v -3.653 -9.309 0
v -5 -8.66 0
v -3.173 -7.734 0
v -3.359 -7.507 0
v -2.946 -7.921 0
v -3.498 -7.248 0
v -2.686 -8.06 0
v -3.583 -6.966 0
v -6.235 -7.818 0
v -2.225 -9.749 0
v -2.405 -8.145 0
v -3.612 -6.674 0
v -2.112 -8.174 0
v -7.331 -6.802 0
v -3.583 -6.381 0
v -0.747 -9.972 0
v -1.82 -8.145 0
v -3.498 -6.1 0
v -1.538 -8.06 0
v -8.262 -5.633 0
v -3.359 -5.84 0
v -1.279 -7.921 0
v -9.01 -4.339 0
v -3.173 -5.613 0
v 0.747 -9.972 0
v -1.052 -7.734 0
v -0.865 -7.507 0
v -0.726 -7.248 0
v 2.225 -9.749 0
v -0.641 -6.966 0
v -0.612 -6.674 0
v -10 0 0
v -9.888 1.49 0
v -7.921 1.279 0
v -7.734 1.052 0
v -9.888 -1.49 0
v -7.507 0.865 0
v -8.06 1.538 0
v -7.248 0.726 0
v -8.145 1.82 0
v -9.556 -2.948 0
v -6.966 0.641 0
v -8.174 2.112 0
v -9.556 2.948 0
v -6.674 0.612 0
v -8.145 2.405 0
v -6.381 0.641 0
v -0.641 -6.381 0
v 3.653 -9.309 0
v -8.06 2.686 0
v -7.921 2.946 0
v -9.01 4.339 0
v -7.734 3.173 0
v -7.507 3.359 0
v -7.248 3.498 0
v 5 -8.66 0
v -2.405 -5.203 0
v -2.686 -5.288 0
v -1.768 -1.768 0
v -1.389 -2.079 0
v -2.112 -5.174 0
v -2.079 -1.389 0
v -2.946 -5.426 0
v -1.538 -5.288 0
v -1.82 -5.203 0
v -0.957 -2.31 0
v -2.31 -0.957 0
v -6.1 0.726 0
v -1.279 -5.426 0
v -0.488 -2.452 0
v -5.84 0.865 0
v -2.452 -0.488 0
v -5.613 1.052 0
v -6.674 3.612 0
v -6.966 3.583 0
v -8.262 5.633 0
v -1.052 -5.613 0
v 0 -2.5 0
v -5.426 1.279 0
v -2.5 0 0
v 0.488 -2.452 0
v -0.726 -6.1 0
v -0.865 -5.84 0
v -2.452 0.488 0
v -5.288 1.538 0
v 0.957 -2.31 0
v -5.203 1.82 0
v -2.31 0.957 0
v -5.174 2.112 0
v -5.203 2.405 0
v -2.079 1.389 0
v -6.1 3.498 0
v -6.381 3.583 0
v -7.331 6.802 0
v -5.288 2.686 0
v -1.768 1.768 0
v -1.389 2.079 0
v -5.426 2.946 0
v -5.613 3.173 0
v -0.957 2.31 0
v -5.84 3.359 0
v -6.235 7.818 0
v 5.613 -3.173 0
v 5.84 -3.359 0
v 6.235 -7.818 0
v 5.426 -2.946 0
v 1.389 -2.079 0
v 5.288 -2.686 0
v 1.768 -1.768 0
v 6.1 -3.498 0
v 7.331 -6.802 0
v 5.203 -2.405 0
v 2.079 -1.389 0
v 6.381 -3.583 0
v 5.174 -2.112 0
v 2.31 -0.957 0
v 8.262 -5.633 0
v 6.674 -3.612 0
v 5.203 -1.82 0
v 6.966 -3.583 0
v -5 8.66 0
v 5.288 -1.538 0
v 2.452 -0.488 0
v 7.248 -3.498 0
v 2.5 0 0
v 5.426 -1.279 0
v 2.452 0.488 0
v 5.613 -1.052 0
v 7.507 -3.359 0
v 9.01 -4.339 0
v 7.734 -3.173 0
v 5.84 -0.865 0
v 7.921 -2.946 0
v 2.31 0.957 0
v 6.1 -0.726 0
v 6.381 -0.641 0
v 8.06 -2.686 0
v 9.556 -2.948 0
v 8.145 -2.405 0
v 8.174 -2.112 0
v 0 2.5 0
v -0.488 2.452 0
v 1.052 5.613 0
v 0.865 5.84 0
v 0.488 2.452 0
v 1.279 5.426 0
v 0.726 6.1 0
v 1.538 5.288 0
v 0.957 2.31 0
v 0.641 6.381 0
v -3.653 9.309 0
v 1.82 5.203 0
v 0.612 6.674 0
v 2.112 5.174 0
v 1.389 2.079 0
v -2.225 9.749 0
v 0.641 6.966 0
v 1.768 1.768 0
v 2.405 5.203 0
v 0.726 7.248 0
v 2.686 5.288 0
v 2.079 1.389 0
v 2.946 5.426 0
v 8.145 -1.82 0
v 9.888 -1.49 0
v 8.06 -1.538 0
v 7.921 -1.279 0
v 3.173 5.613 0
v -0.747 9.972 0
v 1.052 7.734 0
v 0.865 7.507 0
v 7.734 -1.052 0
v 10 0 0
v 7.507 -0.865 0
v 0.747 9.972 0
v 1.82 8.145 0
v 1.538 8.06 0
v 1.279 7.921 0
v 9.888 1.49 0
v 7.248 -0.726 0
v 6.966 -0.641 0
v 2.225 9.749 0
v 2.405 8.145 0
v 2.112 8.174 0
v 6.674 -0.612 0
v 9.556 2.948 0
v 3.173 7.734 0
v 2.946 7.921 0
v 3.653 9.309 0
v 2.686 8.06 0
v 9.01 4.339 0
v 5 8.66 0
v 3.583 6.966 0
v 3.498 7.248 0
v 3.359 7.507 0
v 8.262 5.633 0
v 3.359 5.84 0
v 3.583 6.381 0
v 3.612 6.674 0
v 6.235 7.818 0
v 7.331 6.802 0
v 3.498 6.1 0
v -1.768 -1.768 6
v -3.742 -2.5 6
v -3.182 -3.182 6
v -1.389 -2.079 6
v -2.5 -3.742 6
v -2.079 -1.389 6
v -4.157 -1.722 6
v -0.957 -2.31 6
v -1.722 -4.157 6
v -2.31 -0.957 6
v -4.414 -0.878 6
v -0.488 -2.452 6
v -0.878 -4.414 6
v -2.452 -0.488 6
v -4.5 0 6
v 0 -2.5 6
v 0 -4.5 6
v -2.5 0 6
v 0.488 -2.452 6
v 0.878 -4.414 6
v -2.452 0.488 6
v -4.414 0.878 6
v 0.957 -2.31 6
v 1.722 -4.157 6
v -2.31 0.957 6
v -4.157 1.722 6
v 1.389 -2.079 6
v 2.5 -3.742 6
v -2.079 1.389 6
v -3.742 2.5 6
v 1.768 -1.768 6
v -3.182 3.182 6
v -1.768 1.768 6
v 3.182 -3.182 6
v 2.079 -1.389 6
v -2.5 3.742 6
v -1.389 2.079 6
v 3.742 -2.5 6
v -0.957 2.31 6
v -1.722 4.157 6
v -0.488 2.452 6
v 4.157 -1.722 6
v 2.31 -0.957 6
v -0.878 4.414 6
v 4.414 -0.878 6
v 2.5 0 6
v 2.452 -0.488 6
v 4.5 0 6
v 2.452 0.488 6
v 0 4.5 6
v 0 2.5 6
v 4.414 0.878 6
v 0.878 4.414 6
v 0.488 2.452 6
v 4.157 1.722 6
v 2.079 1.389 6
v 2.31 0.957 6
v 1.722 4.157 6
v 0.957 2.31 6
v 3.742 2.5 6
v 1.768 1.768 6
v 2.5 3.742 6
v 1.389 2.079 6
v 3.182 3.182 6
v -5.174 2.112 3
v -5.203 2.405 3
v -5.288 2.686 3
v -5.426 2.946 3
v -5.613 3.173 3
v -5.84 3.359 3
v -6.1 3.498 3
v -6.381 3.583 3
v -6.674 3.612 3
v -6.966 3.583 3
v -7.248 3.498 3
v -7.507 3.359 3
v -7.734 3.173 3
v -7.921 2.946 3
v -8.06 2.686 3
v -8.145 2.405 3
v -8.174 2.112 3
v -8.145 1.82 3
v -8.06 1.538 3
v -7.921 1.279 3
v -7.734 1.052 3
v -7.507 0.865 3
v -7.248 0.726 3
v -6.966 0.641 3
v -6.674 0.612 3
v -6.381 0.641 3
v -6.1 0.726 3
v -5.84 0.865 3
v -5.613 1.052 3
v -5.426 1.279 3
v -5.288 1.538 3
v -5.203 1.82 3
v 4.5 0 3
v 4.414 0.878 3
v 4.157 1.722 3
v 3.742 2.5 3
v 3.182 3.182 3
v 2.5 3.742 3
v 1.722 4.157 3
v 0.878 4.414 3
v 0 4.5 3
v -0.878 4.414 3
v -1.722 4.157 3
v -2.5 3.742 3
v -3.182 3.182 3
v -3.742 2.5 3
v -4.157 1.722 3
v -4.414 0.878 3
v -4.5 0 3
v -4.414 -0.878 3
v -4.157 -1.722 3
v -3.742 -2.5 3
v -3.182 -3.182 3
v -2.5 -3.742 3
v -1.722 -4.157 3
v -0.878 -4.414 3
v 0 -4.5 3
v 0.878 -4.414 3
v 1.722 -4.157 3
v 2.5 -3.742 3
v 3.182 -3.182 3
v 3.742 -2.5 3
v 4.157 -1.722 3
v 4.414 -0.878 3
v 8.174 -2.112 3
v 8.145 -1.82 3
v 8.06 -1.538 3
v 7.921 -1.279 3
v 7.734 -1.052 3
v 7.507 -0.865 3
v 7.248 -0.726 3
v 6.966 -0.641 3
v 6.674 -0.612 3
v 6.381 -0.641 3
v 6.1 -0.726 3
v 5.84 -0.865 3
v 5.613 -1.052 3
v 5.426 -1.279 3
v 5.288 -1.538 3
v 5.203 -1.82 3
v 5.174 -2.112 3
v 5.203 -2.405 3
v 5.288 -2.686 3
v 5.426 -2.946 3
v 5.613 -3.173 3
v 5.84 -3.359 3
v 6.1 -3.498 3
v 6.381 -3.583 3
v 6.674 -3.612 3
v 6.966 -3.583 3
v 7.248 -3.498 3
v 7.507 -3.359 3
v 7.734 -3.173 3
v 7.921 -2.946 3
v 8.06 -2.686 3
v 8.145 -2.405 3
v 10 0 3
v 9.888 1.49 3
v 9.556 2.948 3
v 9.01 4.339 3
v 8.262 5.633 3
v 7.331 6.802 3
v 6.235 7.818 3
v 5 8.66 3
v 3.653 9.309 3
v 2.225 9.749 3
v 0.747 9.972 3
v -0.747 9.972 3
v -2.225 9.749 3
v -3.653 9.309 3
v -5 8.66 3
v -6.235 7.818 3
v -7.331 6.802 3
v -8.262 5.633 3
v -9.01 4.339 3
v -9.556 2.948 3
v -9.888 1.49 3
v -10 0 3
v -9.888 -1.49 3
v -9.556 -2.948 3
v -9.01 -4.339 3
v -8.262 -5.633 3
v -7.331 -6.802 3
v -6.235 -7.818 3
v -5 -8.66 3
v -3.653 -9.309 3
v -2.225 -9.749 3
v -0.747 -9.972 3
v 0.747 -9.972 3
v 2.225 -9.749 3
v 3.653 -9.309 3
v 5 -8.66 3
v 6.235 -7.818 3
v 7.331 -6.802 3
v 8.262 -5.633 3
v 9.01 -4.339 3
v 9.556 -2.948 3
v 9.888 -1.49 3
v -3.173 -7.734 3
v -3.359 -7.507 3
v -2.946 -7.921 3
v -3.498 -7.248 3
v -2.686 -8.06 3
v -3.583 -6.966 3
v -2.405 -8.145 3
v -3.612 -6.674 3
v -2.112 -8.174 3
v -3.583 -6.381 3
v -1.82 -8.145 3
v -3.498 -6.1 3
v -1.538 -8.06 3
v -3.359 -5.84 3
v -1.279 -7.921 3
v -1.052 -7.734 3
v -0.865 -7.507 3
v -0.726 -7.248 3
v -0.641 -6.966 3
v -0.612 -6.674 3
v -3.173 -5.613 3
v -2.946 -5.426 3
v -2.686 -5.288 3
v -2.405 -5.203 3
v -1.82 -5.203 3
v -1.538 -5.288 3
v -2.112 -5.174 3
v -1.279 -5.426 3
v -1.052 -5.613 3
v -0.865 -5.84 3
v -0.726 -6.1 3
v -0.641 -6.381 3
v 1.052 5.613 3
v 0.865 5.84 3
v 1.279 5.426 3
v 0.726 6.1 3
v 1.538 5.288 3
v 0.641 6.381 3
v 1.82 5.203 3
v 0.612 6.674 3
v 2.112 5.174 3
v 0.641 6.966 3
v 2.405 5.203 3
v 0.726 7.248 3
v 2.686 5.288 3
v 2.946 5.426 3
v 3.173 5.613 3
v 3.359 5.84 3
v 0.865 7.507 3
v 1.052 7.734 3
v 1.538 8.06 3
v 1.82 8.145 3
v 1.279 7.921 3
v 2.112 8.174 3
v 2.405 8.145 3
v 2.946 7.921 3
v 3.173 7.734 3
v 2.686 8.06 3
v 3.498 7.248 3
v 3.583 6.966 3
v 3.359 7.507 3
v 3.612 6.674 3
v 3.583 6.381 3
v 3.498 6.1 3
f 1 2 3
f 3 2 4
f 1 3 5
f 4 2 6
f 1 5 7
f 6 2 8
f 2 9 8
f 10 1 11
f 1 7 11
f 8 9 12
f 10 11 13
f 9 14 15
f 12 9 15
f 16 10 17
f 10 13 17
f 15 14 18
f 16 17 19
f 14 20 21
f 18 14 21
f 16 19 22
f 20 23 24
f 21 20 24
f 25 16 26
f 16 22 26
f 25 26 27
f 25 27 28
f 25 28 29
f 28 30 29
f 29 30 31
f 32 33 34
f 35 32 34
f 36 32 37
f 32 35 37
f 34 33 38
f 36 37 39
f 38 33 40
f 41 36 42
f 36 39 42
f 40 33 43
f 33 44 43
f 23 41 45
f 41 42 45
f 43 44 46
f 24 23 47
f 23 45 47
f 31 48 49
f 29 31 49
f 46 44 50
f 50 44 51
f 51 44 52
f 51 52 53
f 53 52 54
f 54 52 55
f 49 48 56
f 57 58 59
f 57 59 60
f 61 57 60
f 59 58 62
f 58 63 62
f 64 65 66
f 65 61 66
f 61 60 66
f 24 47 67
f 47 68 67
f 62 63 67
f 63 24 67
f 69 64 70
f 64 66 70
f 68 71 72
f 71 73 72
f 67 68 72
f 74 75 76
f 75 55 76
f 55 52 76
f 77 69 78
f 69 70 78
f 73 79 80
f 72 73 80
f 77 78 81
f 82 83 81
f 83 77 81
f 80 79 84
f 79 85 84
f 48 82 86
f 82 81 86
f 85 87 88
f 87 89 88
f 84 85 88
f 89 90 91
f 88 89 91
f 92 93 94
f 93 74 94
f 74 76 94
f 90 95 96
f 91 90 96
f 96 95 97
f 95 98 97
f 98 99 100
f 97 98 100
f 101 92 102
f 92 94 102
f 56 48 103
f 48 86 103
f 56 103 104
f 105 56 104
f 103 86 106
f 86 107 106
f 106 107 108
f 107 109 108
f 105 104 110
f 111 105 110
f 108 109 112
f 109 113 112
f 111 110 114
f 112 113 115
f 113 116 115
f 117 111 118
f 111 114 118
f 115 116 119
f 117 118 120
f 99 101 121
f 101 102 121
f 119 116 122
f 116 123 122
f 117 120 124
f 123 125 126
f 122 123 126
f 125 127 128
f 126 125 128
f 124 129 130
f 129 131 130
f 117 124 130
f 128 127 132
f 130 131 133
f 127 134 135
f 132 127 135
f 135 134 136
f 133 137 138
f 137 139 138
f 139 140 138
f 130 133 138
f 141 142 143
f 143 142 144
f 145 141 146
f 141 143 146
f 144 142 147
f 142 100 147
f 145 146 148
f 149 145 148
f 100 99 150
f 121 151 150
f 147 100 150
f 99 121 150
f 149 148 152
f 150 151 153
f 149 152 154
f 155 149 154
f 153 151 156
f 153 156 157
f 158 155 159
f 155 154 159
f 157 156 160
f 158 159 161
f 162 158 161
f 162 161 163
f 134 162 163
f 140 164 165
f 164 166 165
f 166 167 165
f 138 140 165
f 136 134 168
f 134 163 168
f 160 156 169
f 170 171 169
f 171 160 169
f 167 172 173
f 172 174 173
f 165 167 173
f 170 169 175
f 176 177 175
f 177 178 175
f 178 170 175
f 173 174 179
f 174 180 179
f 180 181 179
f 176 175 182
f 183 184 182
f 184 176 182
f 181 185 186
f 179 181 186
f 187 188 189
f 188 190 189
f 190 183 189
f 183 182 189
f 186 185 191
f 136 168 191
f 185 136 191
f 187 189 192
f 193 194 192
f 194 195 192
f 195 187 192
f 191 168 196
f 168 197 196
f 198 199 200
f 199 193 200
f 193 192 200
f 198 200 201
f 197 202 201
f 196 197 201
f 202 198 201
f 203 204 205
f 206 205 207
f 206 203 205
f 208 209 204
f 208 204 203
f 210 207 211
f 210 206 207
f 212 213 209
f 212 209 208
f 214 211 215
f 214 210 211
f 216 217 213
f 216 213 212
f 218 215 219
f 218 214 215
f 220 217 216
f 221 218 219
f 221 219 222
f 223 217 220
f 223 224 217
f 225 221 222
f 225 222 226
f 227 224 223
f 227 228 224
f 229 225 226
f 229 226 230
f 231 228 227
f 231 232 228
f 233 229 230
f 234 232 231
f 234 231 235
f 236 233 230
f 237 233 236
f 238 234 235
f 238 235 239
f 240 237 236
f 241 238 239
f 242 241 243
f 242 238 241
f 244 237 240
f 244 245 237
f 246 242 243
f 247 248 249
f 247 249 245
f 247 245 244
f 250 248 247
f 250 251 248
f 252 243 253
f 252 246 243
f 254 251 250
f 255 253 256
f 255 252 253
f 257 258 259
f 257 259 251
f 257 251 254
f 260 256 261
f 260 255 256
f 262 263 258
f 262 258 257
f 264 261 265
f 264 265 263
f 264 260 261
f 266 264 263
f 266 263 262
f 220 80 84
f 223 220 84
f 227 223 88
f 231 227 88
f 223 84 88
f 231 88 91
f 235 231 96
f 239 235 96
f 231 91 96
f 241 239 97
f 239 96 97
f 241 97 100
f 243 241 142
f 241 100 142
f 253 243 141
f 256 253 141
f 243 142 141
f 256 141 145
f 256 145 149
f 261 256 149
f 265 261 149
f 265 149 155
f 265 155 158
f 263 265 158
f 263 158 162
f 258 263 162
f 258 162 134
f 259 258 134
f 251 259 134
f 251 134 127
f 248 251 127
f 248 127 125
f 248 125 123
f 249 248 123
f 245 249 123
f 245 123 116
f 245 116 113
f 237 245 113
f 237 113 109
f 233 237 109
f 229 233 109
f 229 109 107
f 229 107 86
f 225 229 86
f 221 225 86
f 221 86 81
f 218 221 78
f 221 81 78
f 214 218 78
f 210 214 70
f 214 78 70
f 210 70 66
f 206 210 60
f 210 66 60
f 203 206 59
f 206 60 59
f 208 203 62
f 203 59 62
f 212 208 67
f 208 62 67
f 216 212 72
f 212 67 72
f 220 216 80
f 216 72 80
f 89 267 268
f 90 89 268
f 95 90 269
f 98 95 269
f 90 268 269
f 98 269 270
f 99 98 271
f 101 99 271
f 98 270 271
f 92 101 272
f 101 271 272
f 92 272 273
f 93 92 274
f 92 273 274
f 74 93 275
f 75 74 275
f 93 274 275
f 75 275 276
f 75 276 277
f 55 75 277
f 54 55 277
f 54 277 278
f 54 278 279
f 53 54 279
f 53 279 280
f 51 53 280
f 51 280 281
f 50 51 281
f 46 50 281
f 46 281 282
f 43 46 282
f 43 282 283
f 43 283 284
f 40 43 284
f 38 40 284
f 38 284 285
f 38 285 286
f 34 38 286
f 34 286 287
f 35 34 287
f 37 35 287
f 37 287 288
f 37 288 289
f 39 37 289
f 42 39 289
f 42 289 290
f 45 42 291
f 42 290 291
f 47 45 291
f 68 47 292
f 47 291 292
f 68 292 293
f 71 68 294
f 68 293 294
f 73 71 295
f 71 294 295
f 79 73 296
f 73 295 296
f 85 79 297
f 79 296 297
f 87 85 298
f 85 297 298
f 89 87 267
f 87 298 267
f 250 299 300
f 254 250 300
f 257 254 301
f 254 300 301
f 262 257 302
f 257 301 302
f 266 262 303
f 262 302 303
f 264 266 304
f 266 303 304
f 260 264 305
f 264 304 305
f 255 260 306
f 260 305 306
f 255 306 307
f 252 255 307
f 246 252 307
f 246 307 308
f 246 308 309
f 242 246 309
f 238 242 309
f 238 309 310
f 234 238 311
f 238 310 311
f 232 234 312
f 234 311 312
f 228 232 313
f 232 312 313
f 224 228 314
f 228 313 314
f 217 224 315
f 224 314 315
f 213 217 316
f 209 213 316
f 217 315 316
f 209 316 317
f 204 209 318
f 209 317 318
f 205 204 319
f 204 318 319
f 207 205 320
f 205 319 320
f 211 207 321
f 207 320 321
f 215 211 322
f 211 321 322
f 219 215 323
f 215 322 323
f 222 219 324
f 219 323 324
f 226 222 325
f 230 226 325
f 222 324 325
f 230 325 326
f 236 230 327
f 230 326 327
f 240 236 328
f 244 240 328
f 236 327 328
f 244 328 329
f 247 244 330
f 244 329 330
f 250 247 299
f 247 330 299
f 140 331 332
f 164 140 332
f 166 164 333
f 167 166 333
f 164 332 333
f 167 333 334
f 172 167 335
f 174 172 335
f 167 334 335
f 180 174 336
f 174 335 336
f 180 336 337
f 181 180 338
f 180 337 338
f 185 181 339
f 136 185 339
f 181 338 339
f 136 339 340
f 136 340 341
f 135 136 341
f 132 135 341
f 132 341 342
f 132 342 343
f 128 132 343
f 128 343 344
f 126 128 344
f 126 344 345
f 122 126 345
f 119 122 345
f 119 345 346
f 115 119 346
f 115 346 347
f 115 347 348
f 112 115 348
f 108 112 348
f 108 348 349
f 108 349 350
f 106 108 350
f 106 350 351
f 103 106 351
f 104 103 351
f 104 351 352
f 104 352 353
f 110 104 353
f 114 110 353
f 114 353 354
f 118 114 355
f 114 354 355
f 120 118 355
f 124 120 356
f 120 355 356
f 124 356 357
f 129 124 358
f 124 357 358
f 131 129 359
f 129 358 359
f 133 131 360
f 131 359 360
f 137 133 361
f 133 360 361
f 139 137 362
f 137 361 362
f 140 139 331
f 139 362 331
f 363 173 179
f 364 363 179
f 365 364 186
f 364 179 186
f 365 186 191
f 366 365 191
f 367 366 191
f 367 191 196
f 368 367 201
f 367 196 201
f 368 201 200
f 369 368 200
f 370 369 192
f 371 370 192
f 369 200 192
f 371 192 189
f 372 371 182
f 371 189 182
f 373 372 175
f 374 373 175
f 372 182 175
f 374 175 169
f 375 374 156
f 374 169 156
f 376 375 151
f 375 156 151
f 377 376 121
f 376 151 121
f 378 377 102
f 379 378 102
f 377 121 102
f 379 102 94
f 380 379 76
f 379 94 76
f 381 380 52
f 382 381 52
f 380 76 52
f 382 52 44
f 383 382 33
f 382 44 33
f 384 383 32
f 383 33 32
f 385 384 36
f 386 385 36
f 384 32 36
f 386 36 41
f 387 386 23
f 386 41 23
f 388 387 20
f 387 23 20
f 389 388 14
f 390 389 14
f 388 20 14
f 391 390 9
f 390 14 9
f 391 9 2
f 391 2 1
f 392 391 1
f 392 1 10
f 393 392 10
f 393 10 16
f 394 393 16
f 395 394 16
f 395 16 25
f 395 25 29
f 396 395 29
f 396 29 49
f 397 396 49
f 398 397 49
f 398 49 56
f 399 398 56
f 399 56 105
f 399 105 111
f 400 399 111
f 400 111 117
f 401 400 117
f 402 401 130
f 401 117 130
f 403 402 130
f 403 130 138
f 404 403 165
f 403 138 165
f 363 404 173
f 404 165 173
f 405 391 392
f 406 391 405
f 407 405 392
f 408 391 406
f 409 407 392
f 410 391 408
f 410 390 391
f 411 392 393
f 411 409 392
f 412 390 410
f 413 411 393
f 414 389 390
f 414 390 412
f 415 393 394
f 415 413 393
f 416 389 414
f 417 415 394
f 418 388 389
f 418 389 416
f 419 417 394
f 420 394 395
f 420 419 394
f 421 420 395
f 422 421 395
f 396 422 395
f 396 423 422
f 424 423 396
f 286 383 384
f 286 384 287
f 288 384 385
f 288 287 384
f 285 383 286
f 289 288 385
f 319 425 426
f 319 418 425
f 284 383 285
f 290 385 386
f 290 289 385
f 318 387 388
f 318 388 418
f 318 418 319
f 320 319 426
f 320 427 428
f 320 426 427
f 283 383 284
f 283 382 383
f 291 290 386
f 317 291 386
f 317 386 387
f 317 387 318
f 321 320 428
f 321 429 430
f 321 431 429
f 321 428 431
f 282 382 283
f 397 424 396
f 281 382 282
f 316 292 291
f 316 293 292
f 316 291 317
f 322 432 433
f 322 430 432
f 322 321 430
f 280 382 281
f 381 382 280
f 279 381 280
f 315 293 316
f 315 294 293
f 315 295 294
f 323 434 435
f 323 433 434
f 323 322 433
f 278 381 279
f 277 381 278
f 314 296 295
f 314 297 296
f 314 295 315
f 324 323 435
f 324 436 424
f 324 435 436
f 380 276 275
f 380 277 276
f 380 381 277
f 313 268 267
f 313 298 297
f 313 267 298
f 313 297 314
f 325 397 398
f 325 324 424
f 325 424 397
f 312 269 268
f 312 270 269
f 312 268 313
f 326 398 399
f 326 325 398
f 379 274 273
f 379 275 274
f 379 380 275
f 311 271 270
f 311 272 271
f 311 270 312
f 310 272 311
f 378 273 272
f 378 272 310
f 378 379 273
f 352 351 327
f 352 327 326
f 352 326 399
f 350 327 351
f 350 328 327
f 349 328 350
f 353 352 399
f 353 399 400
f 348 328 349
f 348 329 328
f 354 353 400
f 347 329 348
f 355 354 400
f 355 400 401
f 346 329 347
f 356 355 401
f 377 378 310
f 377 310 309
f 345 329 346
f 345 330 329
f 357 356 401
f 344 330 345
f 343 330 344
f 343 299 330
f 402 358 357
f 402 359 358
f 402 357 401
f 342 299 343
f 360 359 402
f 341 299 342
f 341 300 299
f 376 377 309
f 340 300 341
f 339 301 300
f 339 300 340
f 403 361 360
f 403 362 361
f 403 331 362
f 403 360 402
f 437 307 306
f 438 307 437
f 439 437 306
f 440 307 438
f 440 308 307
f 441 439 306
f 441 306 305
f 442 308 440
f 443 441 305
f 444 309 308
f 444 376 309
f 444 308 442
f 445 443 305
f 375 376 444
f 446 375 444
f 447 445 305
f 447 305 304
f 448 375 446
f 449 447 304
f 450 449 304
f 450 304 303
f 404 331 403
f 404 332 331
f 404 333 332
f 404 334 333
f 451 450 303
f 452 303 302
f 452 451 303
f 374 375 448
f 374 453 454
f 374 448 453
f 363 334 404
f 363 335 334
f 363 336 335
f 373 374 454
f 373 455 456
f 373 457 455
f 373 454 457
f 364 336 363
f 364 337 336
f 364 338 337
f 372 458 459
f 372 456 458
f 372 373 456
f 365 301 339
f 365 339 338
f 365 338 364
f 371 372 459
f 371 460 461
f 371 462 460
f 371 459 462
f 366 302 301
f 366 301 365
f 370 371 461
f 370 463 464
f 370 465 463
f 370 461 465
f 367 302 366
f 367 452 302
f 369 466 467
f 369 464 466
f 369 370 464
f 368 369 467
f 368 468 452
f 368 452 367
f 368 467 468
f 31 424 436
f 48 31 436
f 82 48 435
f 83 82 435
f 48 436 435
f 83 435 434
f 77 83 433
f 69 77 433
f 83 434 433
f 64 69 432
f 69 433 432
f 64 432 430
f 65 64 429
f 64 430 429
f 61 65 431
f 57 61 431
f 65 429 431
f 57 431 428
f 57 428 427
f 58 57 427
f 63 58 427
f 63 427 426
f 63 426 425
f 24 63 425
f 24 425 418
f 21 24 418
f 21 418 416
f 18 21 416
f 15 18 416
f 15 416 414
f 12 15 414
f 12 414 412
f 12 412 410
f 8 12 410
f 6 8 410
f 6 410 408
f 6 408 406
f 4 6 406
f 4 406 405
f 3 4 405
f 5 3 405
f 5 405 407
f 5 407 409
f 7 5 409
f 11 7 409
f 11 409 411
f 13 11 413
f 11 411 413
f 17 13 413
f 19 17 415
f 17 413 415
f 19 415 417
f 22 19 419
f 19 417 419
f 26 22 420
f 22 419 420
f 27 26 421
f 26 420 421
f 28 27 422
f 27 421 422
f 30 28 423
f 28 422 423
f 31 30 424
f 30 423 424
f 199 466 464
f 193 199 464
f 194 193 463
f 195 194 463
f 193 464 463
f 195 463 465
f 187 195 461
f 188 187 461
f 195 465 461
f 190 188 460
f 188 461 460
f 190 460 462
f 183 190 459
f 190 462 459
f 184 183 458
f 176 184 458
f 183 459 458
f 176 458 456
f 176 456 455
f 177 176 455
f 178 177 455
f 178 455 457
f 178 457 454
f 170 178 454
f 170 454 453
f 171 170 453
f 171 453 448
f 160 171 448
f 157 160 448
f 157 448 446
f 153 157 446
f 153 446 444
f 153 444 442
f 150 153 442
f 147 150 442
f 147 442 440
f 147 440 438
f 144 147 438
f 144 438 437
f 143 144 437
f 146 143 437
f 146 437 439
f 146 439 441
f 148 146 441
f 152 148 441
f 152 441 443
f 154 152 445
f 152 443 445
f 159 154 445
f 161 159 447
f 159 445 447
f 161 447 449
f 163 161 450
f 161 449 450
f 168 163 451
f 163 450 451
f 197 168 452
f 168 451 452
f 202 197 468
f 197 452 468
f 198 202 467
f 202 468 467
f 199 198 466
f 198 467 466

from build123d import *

# Parameters (mm, degrees)
SKETCH1_R             = 10
BOSS_EXTRUDE1_DEPTH   = 3
SKETCH2_R             = 4.5
BOSS_EXTRUDE2_DEPTH   = 3
F_3_0MM_DOWEL_HOLE1_D = 3
F_5_0MM_DOWEL_HOLE1_D = 5


with BuildPart() as part:
    # Sketch1 → Boss-Extrude1 (new body)
    with BuildSketch(Plane.XY):
        Circle(SKETCH1_R)
    extrude(amount=BOSS_EXTRUDE1_DEPTH)

    # Sketch2 → Boss-Extrude2 (add)
    with BuildSketch(Plane.XY.offset(3)):
        Circle(SKETCH2_R)
    extrude(amount=BOSS_EXTRUDE2_DEPTH)

    # Ø3.0mm Dowel Hole1 (through all)
    with Locations(Plane(origin=(0, 0, 0), x_dir=(-1, 0, 0), z_dir=(0, 0, -1))):
        with Locations((6.673703276, 2.112270007), (2.112270007, -6.673703276), (-6.673703276, -2.112270007), (-2.112270007, 6.673703276)):
            Hole(F_3_0MM_DOWEL_HOLE1_D / 2)

    # Ø5.0mm Dowel Hole1 (through all)
    with Locations(Plane.XY.offset(6)):
        with Locations((0, 0)):
            Hole(F_5_0MM_DOWEL_HOLE1_D / 2)


solid = part.part
